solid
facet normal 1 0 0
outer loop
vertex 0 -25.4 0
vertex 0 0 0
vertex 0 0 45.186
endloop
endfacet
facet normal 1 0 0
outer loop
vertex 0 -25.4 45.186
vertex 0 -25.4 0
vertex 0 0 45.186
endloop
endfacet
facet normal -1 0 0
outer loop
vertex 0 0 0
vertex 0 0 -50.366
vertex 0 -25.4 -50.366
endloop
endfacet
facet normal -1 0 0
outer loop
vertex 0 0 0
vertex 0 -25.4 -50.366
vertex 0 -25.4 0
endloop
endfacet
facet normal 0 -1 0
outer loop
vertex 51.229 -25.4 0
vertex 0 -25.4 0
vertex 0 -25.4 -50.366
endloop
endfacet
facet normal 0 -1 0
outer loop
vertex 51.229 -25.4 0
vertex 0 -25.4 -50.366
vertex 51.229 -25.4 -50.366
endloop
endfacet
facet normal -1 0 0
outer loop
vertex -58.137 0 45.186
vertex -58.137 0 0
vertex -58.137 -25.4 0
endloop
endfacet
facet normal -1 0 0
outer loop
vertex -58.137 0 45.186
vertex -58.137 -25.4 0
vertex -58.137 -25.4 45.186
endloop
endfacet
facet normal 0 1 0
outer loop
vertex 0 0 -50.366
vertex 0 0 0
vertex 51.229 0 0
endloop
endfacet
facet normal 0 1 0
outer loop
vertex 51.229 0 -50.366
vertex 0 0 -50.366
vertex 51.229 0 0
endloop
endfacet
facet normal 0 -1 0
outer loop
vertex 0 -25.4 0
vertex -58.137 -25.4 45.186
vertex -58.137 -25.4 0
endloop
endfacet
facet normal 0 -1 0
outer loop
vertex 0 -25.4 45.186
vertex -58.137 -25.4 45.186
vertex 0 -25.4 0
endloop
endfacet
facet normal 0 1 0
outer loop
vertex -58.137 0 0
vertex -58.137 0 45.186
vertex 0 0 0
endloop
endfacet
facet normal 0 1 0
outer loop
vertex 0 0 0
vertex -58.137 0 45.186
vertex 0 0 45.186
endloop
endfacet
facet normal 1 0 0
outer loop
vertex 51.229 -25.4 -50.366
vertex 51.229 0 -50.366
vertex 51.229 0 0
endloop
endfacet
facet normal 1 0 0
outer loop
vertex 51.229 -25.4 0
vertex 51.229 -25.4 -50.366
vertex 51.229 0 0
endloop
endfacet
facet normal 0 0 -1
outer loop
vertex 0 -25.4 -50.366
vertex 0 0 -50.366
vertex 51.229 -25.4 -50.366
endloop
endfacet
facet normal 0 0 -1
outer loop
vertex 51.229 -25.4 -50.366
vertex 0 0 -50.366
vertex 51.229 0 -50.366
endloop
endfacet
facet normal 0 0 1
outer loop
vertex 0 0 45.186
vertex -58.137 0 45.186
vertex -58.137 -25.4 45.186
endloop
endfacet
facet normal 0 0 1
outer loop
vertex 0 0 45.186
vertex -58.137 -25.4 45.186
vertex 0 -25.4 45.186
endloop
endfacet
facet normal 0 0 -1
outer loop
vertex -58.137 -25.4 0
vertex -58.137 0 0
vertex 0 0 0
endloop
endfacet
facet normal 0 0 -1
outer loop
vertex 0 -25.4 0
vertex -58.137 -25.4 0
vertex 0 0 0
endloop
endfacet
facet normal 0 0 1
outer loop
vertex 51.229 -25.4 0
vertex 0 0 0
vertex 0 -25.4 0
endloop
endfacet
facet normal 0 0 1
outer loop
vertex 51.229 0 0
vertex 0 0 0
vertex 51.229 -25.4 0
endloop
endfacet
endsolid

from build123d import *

# Parameters (mm, degrees)
F0_R        = 54.7360857457
F1_DEPTH    = 25.4
F2_R        = 36.2738020699
F3_DEPTH    = 25.4
F4_R        = 11.1169044366
F5_DEPTH    = 25.4
F1_FACE_R   = 54.7360857457
F1_FACE_R_2 = 36.2738020699
F6_DEPTH    = 25.4
F8_W        = 58.1367611885
F8_H        = 45.1855063438
F9_DEPTH    = 25.4
F8_W_2      = 51.2294247746
F8_H_2      = 50.3660067916


with BuildPart() as f1:
    # F0 (on Front) → F1 (new body)
    with BuildSketch(Plane.XZ):
        Circle(F0_R)
    extrude(amount=F1_DEPTH)

    # F2 (on face) → F3 (join)
    with BuildSketch(Plane.XZ.offset(25.4)):
        Circle(F2_R)
    extrude(amount=F3_DEPTH)

    # F4 (on face) → F5 (join)
    with BuildSketch(Plane.XZ.offset(50.8)):
        Circle(F4_R)
    extrude(amount=F5_DEPTH)

    # F1_face (on face) + F2 (on face) → F6 (intersect)
    with BuildSketch(Plane.XZ.offset(25.4)):
        Circle(F1_FACE_R)
        Circle(F1_FACE_R_2, mode=Mode.SUBTRACT)
    with BuildSketch(Plane.XZ.offset(25.4)):
        Circle(F2_R)
    extrude(amount=-F6_DEPTH, mode=Mode.INTERSECT)


with BuildPart() as f9:
    # F8 (on Front) → F9 (new body)
    with BuildSketch(Plane.XZ):
        with Locations((-29.0683805943, 22.5927531719)):
            Rectangle(F8_W, F8_H)
    extrude(amount=F9_DEPTH)


with BuildPart() as f9b:
    # F8 (on Front) → F9, piece 2 (new body)
    with BuildSketch(Plane.XZ):
        with Locations((25.6147123873, -25.1830033958)):
            Rectangle(F8_W_2, F8_H_2)
    extrude(amount=F9_DEPTH)


solid = Compound([f9.part, f9b.part])
